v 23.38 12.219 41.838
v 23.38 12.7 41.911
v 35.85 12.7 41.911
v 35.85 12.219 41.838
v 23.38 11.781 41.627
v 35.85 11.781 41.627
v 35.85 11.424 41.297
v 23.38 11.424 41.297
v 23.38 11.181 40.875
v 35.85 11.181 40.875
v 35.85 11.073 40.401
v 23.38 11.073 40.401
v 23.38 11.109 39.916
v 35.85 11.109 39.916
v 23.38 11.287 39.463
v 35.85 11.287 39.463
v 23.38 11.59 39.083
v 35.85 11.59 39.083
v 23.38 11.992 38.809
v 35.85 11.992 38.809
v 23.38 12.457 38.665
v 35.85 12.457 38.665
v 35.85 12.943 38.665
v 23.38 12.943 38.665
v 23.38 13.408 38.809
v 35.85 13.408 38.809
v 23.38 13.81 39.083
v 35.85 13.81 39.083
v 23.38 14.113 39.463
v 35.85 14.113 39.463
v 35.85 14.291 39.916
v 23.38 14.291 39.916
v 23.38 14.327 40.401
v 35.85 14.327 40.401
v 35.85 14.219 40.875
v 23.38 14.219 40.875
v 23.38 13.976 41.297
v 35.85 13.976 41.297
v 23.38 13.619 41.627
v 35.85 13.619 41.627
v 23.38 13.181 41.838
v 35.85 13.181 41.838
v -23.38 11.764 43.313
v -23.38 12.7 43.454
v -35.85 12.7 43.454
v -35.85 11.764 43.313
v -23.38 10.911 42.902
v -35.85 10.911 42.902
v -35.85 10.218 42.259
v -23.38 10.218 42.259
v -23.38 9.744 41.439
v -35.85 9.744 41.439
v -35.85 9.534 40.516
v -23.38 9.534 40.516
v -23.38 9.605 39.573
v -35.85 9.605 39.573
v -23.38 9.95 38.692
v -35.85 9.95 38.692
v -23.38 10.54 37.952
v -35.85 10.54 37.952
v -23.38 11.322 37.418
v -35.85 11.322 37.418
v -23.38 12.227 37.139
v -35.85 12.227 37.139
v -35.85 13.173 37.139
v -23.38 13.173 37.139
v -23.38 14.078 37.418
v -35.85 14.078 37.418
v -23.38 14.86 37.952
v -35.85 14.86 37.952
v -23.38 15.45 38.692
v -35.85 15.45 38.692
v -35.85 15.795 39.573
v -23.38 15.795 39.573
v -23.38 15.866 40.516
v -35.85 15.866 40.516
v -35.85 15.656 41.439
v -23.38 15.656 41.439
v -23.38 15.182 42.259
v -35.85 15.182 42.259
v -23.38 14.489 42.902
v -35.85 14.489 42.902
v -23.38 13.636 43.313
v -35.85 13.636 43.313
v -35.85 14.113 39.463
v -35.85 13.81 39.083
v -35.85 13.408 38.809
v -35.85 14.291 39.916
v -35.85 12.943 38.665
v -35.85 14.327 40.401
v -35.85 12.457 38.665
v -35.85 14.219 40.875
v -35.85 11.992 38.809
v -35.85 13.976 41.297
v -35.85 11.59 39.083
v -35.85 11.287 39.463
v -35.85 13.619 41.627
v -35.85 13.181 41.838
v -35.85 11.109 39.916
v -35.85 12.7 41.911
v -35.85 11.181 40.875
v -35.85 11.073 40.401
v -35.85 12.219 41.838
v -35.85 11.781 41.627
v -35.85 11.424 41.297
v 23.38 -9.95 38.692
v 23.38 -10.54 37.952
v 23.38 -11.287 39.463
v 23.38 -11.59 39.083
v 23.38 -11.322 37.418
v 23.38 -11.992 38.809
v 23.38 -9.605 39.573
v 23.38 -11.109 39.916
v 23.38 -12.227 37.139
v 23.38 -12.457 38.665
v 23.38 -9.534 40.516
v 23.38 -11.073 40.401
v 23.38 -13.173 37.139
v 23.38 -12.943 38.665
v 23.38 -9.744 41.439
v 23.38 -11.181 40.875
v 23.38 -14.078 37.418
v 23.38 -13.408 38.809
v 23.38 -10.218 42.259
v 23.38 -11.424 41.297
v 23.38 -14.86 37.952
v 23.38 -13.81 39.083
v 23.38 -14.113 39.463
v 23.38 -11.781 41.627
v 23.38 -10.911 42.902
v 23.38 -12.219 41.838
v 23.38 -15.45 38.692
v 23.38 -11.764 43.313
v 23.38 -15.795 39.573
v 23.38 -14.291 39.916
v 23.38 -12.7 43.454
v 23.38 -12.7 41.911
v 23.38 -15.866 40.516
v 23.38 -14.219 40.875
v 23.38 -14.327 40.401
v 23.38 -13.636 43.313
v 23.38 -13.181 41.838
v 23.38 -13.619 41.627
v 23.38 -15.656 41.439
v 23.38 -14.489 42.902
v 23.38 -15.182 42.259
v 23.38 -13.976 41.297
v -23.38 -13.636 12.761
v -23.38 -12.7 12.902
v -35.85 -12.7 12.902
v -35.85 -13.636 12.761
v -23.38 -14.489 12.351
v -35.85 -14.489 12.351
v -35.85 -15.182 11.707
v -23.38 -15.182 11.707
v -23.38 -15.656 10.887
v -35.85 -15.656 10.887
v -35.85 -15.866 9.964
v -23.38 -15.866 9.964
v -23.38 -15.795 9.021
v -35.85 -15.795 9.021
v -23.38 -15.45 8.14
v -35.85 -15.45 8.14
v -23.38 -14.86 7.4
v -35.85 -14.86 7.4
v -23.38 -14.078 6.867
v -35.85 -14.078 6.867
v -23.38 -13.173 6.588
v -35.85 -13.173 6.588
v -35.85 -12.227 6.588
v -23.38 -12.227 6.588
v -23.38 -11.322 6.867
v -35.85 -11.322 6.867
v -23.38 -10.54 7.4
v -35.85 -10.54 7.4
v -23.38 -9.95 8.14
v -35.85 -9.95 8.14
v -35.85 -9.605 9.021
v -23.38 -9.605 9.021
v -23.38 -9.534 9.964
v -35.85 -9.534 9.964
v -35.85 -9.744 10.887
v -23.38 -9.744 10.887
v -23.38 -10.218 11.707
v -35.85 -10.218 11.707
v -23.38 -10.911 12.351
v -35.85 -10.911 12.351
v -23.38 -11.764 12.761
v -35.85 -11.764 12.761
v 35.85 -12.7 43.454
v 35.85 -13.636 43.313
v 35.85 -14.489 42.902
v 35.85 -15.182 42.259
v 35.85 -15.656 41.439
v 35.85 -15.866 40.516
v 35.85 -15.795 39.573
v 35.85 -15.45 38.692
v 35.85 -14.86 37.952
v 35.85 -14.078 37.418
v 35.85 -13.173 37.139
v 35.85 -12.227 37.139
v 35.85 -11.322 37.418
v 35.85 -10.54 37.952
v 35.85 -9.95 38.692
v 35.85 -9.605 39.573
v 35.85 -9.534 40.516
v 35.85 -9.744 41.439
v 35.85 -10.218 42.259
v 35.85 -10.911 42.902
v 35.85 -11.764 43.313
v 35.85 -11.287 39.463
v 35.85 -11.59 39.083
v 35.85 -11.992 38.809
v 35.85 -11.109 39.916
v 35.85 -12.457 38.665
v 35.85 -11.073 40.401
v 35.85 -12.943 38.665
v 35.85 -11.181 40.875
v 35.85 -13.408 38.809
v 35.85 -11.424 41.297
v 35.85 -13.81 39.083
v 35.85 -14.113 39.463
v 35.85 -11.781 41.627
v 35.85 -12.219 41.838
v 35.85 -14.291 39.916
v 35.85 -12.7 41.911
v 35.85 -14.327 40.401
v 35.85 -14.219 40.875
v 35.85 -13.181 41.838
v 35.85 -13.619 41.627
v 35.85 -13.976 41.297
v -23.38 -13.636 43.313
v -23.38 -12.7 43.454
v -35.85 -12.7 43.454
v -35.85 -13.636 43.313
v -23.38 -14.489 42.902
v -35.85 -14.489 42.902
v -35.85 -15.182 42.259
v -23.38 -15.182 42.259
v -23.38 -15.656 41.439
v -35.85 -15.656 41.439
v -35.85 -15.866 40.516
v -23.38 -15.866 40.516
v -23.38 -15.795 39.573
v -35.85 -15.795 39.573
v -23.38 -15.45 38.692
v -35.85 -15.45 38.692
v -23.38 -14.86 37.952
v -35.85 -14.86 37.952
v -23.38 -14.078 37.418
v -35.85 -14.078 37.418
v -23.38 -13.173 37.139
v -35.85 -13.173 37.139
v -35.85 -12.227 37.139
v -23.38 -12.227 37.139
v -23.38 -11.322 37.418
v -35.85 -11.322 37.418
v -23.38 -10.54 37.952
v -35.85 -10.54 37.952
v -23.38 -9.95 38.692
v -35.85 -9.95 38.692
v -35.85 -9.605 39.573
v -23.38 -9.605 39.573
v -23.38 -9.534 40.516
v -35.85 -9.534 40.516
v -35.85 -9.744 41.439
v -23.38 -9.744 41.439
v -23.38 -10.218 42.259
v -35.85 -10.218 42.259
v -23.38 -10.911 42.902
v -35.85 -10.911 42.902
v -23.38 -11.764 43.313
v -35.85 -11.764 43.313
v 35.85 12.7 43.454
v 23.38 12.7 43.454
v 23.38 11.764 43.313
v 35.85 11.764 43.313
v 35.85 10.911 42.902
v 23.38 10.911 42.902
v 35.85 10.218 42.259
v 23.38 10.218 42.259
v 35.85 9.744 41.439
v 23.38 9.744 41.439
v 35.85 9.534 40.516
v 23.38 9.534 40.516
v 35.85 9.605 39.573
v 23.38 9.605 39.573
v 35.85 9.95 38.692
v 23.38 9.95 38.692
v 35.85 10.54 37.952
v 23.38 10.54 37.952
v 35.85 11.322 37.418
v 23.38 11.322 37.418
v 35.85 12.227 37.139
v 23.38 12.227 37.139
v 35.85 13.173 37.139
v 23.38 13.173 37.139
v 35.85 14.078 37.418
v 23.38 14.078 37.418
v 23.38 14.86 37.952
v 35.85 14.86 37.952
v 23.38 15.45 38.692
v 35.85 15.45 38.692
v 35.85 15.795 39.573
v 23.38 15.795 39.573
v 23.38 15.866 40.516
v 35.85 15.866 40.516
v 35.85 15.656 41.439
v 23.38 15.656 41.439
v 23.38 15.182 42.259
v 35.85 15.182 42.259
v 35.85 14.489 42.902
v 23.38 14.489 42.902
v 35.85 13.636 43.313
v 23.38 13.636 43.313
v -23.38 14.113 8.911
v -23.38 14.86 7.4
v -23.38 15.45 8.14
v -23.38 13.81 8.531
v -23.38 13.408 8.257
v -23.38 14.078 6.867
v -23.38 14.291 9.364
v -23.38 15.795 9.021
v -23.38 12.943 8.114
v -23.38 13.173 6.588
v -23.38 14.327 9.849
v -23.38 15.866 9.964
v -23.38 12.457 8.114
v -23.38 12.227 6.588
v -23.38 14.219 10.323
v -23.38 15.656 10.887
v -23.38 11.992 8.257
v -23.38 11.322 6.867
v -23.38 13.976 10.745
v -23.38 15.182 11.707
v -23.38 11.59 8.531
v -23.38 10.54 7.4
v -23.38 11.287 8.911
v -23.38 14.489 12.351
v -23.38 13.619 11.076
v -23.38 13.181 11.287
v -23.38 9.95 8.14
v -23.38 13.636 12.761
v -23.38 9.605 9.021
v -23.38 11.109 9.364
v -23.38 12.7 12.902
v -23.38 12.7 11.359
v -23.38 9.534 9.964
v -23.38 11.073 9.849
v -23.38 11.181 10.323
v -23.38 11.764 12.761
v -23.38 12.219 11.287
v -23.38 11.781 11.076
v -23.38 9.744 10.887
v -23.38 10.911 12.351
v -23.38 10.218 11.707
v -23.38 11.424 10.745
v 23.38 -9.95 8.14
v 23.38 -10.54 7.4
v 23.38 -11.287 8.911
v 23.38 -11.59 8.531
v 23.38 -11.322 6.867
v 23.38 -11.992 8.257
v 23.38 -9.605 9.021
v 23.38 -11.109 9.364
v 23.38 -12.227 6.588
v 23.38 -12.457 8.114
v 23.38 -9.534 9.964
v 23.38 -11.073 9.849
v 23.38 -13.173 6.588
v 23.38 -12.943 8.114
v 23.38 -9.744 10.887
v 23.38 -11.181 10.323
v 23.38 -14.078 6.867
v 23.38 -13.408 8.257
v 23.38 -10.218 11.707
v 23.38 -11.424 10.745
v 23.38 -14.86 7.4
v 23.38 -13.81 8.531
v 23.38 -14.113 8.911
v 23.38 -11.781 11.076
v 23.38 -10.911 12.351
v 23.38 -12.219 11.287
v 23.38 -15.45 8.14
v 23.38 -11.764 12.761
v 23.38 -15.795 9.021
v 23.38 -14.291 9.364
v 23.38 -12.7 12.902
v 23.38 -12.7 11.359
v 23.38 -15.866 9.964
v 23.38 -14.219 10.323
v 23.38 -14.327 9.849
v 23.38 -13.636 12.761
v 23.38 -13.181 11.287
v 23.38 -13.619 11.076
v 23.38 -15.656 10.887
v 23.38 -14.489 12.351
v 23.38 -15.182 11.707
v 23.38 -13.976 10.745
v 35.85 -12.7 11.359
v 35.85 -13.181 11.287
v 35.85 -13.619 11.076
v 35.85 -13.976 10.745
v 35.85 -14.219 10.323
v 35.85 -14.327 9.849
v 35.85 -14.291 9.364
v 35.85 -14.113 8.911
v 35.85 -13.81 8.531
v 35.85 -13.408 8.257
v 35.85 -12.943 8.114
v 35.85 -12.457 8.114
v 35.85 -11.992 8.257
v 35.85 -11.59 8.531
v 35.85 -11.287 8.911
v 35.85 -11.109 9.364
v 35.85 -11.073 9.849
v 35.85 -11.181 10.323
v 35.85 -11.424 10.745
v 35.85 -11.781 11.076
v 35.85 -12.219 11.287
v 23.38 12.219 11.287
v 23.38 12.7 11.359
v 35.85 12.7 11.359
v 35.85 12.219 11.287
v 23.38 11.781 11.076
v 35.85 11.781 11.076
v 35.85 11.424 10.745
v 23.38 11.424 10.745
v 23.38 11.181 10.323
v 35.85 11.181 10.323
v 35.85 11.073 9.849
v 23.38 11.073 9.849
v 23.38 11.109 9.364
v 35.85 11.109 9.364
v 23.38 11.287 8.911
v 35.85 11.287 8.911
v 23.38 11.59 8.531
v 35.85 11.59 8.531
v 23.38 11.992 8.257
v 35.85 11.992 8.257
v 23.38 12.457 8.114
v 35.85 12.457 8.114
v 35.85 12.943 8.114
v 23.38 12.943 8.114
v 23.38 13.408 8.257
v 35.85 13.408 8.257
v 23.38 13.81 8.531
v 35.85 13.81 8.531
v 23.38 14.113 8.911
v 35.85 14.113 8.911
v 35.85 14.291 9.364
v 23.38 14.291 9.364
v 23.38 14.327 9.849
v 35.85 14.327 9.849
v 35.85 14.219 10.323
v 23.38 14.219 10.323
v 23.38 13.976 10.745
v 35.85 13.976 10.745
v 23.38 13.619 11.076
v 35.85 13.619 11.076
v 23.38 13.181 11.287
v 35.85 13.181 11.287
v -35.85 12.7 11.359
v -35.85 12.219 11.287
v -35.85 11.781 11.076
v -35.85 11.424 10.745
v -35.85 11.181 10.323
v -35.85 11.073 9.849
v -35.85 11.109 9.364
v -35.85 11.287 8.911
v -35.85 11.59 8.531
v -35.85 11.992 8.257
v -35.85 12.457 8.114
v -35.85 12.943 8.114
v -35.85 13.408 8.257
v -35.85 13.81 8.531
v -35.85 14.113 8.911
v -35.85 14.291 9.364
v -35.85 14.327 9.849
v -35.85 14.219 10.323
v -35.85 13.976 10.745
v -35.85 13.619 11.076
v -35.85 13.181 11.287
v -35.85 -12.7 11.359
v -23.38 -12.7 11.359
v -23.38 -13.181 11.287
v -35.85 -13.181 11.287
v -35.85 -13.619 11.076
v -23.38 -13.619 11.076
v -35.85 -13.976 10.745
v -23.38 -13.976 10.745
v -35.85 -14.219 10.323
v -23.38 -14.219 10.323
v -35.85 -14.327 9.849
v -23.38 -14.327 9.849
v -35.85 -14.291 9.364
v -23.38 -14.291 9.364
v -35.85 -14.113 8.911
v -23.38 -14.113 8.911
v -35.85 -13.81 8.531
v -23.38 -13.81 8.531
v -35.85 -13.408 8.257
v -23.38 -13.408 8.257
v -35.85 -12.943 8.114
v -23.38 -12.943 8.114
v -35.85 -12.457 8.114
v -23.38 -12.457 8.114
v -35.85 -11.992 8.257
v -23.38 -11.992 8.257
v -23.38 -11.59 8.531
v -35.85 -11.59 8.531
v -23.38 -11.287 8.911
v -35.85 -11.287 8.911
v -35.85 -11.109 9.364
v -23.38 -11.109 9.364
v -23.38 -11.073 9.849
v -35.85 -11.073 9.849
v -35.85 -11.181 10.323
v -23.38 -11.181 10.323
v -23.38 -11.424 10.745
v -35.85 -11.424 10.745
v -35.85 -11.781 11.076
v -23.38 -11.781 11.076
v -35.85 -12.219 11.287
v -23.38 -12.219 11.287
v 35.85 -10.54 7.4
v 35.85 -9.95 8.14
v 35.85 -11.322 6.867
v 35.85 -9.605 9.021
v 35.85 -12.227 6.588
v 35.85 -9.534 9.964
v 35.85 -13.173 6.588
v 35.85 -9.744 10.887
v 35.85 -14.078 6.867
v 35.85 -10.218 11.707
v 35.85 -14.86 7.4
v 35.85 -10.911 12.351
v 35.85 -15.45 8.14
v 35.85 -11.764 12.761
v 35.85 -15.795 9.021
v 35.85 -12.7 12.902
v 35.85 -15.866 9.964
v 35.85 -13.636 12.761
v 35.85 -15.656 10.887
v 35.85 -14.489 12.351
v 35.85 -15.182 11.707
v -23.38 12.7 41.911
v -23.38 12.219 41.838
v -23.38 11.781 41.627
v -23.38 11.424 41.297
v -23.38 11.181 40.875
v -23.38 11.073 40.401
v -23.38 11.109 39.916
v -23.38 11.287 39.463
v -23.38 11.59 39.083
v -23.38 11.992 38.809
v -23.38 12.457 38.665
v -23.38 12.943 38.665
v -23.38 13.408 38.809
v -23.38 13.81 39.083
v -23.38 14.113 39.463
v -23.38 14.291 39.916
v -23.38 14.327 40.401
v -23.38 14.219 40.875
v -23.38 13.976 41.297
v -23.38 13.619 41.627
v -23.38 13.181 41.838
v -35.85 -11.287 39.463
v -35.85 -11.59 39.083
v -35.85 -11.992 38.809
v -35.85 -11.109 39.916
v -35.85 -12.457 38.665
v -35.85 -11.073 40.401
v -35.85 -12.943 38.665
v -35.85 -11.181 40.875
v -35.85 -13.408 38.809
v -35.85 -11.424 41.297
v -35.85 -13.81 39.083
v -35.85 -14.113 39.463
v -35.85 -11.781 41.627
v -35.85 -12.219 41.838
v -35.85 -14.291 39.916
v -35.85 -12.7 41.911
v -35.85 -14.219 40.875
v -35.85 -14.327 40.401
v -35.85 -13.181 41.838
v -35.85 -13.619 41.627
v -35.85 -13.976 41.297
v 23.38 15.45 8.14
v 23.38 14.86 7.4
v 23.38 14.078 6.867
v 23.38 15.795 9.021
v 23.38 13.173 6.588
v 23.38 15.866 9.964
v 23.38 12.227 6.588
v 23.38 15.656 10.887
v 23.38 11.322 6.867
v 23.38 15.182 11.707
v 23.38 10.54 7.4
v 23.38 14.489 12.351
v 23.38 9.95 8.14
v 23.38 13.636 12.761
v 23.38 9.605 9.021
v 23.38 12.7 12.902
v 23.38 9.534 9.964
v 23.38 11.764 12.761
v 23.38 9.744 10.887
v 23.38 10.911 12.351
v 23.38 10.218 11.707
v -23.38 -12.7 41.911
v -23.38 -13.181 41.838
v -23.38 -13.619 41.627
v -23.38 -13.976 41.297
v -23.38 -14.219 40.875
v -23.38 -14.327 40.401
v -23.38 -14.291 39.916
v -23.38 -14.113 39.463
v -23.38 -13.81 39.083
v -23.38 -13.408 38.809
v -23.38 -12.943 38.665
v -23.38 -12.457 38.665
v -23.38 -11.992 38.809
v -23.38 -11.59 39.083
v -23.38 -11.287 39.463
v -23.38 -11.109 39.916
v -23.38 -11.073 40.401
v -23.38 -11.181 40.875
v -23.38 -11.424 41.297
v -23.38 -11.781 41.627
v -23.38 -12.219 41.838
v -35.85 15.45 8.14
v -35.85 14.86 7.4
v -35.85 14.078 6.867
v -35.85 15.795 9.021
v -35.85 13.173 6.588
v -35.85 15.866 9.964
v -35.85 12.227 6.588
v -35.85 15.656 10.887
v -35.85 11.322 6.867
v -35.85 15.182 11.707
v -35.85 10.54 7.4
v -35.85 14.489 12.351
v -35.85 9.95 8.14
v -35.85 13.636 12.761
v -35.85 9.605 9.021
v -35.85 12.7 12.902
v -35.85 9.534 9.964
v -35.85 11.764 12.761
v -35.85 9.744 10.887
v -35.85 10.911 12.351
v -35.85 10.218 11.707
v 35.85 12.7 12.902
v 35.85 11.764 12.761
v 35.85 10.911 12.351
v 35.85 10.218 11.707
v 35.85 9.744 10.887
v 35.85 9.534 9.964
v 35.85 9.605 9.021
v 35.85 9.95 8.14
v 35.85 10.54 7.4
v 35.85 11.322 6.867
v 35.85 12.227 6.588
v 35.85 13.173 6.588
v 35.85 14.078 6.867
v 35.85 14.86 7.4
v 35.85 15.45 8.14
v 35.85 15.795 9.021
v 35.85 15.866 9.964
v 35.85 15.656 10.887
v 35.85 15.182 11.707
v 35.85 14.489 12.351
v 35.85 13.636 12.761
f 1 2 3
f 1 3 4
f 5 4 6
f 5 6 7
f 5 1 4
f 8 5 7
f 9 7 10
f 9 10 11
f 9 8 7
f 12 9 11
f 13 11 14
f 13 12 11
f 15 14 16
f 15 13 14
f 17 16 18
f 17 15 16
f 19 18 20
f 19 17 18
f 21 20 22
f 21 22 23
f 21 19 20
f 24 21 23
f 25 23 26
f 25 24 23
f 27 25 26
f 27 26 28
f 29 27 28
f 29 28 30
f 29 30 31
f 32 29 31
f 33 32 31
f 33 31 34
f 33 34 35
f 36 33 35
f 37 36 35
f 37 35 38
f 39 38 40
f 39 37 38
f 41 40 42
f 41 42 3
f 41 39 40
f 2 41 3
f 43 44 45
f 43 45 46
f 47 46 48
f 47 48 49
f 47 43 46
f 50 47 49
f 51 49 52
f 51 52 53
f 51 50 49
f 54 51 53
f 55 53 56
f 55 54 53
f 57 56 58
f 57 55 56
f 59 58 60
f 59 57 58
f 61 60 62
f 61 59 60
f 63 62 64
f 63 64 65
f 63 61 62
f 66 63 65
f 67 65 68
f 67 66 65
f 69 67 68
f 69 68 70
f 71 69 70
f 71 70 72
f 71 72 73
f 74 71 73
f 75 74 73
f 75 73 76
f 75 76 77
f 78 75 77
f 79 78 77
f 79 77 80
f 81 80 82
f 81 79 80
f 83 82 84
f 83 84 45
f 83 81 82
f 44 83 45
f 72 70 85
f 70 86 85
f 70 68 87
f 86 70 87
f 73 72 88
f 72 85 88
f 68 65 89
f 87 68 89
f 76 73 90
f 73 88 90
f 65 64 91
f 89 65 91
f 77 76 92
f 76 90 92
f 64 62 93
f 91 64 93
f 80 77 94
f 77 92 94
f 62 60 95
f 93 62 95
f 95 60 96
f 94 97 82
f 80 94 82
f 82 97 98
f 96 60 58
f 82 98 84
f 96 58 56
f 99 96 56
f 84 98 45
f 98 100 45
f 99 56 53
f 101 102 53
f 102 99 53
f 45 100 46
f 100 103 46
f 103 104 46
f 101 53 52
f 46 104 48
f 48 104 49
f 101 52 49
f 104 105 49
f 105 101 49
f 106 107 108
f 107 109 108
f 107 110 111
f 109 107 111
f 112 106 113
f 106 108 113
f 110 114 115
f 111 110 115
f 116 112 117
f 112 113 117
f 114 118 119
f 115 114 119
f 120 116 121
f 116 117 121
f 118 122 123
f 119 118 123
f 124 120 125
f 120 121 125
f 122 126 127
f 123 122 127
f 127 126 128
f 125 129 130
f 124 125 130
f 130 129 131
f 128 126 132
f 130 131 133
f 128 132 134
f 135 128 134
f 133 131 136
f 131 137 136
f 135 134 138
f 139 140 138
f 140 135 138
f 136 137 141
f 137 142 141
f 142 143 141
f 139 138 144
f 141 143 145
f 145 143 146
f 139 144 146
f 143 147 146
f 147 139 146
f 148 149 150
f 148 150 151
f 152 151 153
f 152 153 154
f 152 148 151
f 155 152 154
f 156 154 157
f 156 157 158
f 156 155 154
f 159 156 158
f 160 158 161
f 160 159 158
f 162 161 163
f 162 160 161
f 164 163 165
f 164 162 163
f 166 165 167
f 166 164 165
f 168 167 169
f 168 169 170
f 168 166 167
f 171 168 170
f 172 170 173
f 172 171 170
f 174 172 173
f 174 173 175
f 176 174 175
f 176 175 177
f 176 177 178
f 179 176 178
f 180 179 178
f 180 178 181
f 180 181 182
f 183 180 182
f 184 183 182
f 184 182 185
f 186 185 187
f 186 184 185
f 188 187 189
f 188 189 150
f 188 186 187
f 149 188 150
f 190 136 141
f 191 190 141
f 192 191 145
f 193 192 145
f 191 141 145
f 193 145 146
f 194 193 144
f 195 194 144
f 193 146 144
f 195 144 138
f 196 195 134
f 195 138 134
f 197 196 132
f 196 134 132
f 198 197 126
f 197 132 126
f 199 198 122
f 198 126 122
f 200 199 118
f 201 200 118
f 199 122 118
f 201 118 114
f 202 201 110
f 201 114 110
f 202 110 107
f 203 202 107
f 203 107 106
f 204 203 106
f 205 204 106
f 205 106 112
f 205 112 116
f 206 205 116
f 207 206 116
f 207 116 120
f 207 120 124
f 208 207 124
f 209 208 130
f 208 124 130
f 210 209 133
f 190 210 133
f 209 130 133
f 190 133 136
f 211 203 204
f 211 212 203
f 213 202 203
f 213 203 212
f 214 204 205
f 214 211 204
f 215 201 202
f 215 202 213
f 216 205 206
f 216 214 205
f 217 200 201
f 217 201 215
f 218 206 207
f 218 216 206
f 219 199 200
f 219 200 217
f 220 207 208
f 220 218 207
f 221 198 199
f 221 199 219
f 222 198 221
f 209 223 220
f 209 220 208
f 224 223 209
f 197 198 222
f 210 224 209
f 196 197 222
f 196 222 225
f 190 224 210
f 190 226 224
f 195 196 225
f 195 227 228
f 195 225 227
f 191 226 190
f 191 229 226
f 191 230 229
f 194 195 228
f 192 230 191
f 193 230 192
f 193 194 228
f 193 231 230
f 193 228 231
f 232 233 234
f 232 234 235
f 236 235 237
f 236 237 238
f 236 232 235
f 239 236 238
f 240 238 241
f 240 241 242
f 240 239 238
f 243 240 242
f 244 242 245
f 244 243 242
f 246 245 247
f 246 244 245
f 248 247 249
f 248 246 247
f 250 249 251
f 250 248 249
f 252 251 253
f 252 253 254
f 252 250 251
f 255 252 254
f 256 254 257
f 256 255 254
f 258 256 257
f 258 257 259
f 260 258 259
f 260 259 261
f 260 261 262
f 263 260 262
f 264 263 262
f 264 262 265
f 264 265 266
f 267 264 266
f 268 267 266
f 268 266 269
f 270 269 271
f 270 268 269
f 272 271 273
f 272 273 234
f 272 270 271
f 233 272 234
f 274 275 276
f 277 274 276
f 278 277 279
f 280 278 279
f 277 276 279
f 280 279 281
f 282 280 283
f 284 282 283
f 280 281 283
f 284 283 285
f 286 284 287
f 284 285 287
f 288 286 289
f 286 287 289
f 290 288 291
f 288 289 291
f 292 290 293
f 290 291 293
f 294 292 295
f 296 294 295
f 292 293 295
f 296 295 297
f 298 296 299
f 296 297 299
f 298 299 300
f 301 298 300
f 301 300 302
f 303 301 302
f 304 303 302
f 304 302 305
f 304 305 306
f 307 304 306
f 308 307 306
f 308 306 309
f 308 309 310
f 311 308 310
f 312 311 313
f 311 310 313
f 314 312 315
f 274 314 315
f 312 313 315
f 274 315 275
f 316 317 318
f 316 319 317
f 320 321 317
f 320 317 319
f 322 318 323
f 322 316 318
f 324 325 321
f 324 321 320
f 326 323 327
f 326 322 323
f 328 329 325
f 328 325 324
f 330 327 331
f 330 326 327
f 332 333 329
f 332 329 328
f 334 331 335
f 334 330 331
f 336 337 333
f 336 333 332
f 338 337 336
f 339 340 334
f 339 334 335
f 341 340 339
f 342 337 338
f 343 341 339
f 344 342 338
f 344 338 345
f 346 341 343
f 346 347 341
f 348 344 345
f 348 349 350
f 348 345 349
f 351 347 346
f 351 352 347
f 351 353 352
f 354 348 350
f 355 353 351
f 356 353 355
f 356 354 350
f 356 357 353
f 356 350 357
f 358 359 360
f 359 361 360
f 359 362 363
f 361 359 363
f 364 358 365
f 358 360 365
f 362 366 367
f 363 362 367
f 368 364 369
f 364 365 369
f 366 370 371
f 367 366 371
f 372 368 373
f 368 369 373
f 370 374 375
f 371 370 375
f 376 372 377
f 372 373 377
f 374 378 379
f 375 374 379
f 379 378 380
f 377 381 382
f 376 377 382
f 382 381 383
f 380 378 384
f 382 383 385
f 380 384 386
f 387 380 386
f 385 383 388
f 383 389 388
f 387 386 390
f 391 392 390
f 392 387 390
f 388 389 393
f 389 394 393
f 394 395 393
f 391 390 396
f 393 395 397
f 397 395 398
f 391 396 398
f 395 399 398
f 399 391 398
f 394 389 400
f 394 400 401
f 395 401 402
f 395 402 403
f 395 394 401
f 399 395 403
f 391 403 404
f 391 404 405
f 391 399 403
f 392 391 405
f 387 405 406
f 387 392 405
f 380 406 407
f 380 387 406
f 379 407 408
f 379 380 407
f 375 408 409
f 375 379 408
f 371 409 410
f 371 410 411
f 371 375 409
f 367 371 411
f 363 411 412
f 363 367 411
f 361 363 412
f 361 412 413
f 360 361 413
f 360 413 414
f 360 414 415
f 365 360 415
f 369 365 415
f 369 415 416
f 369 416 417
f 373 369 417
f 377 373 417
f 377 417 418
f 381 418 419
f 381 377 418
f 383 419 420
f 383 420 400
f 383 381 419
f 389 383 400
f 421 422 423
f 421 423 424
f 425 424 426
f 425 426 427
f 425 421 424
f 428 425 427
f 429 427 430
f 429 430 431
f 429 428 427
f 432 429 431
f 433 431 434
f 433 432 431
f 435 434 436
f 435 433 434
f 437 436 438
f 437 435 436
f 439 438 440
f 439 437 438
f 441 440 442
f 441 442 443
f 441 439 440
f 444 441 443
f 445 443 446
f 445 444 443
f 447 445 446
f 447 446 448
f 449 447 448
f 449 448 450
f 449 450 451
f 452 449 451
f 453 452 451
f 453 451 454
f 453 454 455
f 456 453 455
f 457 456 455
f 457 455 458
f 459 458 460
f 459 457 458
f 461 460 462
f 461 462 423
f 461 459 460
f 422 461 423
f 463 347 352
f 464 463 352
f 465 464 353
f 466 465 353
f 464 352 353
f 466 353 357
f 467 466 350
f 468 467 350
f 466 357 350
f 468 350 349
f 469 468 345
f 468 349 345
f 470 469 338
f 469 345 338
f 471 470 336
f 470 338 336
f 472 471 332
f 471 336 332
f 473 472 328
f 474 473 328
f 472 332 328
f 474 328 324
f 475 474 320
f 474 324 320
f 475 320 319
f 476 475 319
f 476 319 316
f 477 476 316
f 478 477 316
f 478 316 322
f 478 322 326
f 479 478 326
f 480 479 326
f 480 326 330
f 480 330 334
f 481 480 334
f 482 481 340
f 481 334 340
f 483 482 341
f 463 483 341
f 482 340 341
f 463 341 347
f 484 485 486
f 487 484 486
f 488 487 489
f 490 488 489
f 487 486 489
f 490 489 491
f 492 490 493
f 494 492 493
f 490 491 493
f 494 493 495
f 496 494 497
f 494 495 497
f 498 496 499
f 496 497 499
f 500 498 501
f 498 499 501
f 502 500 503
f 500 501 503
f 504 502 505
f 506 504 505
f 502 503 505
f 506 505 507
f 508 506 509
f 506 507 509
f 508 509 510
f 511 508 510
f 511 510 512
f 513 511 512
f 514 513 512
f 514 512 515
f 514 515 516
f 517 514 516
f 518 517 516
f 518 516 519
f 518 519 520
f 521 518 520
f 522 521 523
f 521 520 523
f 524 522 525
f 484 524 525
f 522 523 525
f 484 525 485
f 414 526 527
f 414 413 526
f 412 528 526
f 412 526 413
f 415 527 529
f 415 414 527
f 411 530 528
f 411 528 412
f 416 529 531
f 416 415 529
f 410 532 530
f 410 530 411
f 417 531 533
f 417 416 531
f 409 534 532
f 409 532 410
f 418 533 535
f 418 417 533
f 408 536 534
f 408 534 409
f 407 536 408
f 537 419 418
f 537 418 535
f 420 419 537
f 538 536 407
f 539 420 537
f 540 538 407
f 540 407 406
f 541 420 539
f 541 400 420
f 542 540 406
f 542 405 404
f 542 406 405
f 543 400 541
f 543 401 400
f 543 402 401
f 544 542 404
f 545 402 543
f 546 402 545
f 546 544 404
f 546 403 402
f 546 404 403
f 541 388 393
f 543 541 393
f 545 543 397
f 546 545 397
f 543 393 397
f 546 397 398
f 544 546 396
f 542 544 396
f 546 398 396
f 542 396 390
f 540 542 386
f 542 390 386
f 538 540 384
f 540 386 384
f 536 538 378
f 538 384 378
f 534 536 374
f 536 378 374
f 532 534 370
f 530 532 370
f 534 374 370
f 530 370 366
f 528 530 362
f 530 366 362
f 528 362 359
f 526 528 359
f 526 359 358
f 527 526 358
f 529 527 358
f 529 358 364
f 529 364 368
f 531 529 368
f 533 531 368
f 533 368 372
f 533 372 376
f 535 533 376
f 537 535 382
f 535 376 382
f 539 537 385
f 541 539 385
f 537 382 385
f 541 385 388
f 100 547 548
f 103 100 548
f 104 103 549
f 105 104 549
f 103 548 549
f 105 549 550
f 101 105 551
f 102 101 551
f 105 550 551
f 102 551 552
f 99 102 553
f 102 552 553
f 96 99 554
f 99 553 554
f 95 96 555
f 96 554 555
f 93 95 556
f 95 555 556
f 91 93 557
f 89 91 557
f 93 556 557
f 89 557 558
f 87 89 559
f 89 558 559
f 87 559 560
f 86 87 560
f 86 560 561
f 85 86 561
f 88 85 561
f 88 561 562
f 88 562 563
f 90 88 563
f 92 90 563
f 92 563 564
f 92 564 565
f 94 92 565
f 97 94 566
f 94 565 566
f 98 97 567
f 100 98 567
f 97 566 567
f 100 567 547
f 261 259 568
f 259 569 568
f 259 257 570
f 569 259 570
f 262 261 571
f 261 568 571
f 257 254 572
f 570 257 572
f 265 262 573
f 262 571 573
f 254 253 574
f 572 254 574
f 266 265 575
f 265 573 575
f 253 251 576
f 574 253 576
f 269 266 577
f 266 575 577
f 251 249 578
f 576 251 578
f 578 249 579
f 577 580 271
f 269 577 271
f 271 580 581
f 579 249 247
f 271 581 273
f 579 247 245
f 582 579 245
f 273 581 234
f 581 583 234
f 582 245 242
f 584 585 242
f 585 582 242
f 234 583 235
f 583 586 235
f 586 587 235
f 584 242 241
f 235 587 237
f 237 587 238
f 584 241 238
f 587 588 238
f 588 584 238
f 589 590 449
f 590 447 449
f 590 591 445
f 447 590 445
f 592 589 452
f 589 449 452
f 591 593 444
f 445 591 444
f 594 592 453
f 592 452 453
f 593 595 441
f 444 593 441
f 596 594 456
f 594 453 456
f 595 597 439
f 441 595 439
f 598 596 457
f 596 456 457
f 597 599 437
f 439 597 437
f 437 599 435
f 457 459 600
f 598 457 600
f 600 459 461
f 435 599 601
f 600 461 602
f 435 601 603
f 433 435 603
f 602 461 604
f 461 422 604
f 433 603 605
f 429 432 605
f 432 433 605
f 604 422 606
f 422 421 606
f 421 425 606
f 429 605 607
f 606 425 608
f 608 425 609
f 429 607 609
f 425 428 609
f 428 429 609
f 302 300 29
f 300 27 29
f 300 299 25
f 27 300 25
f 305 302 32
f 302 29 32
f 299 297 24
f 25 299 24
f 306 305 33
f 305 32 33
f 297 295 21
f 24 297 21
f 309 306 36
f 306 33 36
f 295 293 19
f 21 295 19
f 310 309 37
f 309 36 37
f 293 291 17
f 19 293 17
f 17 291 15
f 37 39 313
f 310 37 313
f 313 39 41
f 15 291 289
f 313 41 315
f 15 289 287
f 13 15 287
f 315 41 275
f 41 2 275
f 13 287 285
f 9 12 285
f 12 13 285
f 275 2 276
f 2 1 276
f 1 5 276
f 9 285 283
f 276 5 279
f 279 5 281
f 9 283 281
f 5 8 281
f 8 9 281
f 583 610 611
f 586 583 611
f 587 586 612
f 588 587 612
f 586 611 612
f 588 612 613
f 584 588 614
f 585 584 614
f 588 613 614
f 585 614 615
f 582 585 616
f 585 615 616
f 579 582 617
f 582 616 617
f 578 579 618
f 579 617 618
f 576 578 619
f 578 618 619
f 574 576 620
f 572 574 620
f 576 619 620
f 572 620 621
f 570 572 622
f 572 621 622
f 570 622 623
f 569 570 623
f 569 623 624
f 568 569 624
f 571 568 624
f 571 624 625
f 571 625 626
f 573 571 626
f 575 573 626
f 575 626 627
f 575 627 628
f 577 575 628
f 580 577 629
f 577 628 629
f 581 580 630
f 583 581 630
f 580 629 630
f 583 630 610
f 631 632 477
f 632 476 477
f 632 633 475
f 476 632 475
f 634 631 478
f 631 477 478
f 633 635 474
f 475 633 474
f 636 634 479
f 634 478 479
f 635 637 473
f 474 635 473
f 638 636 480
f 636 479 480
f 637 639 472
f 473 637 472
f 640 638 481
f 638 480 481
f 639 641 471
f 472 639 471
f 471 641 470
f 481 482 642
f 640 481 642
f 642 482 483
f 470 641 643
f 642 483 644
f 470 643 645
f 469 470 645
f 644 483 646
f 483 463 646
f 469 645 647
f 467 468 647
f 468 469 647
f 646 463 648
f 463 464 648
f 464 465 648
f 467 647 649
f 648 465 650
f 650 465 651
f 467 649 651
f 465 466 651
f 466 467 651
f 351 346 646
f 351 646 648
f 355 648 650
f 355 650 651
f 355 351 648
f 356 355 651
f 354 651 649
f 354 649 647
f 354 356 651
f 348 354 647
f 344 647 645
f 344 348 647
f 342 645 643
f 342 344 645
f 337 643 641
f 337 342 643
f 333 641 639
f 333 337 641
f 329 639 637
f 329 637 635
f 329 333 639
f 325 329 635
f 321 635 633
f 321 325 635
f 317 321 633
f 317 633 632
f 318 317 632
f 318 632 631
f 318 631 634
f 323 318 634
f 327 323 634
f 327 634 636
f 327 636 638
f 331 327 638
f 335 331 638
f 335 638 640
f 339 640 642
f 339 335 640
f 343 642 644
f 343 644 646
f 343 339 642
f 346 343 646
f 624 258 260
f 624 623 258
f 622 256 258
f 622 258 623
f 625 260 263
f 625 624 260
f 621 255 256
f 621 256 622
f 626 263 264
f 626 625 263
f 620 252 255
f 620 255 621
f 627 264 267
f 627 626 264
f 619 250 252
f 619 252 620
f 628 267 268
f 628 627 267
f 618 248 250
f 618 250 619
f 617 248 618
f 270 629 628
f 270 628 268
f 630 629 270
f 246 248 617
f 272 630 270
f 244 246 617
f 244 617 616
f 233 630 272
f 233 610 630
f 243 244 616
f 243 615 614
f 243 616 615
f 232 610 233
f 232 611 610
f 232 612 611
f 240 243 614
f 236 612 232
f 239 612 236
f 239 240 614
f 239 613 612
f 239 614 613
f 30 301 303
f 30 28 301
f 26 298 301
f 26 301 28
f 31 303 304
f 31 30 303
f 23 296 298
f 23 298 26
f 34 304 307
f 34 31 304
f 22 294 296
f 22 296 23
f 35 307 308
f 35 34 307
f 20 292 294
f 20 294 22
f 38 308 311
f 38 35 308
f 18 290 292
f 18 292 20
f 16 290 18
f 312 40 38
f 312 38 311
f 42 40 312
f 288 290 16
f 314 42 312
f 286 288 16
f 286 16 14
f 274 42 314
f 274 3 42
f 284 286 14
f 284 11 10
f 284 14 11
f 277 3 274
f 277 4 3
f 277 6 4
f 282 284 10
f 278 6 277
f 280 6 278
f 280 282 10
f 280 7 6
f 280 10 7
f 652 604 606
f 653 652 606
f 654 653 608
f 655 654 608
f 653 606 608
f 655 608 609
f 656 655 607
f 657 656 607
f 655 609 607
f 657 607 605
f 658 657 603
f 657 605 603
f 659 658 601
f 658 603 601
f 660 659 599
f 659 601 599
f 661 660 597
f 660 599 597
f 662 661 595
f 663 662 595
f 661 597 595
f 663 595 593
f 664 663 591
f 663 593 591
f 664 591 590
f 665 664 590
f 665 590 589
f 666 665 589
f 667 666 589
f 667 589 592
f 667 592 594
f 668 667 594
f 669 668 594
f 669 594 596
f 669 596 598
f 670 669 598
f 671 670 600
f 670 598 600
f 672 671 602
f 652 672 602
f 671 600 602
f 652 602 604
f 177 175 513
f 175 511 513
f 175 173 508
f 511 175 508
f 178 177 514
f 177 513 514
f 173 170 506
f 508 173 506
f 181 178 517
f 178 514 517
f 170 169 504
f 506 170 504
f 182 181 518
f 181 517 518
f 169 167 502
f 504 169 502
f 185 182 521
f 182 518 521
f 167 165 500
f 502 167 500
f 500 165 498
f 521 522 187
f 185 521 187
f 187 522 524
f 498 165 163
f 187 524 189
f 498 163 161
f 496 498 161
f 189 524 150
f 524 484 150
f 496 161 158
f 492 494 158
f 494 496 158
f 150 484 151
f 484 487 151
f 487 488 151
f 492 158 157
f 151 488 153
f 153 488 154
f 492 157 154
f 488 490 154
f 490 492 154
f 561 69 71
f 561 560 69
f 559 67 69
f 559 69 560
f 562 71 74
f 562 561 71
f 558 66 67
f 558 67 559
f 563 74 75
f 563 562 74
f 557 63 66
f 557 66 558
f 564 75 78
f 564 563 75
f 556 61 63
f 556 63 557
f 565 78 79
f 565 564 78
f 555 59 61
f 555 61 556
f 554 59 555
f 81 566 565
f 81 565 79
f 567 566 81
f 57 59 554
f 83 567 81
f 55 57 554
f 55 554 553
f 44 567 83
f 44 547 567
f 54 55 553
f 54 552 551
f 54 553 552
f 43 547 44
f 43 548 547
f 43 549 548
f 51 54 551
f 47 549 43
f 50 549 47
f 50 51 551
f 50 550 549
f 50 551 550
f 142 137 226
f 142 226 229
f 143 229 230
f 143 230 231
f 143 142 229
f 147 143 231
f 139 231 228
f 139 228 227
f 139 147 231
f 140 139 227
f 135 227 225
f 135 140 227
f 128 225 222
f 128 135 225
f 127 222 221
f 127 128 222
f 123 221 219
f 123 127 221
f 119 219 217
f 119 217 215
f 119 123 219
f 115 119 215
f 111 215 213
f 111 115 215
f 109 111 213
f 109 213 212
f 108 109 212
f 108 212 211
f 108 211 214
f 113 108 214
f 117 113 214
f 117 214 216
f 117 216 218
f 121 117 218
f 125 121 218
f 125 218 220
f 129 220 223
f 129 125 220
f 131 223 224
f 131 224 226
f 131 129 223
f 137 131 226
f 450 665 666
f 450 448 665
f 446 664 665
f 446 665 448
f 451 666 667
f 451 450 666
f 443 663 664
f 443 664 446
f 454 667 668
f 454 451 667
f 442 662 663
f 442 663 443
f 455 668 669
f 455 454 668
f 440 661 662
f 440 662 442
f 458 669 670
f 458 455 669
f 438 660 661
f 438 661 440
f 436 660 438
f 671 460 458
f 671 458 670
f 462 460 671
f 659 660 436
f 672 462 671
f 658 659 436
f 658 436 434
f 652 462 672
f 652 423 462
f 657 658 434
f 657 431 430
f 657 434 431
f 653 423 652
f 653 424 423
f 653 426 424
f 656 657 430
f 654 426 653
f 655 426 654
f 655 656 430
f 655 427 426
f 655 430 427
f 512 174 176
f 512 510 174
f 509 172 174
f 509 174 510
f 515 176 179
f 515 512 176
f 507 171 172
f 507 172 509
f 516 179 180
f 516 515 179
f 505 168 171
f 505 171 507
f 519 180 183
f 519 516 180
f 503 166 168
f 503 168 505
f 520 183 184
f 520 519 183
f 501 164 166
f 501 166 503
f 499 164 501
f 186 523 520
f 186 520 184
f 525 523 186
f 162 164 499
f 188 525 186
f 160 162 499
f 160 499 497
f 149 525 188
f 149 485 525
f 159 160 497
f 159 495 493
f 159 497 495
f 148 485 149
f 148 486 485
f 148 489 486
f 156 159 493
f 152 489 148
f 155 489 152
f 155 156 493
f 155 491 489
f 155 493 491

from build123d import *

# Parameters (mm, degrees)
BOSS_EXTRUDE2_START   = 23.38
SKETCH2_R             = 3.175
SKETCH2_R_2           = 1.63195
BOSS_EXTRUDE2_DEPTH   = 12.469999952
BOSS_EXTRUDE2_2_DEPTH = 12.469999952
BOSS_EXTRUDE2_3_DEPTH = 12.469999952
BOSS_EXTRUDE2_4_DEPTH = 12.469999952


with BuildPart() as part:
    # Sketch2 → Boss-Extrude2 (new body)
    with BuildSketch(Plane(origin=(0, 0, 0), x_dir=(0, 0, -1), z_dir=(1, 0, 0)).offset(BOSS_EXTRUDE2_START)):
        with Locations(Location((-40.279022884, 12.7, 0), (0, 0, 180))):
            Circle(SKETCH2_R)
        with Locations(Location((-40.279022884, 12.7, 0), (0, 0, 180))):
            Circle(SKETCH2_R_2, mode=Mode.SUBTRACT)
    extrude(amount=BOSS_EXTRUDE2_DEPTH)


with BuildPart() as body_2:
    # Sketch2 → Boss-Extrude2 2 (new body)
    with BuildSketch(Plane(origin=(0, 0, 0), x_dir=(0, 0, -1), z_dir=(1, 0, 0)).offset(BOSS_EXTRUDE2_START)):
        with Locations(Location((-40.279022884, -12.7, 0), (0, 0, 180))):
            Circle(SKETCH2_R)
        with Locations(Location((-40.279022884, -12.7, 0), (0, 0, 180))):
            Circle(SKETCH2_R_2, mode=Mode.SUBTRACT)
    extrude(amount=BOSS_EXTRUDE2_2_DEPTH)


with BuildPart() as body_3:
    # Sketch2 → Boss-Extrude2 3 (new body)
    with BuildSketch(Plane(origin=(0, 0, 0), x_dir=(0, 0, -1), z_dir=(1, 0, 0)).offset(BOSS_EXTRUDE2_START)):
        with Locations(Location((-9.727227116, -12.7, 0), (0, 0, 180))):
            Circle(SKETCH2_R)
        with Locations(Location((-9.727227116, -12.7, 0), (0, 0, 180))):
            Circle(SKETCH2_R_2, mode=Mode.SUBTRACT)
    extrude(amount=BOSS_EXTRUDE2_3_DEPTH)


with BuildPart() as body_4:
    # Sketch2 → Boss-Extrude2 4 (new body)
    with BuildSketch(Plane(origin=(0, 0, 0), x_dir=(0, 0, -1), z_dir=(1, 0, 0)).offset(BOSS_EXTRUDE2_START)):
        with Locations(Location((-9.727227116, 12.7, 0), (0, 0, 180))):
            Circle(SKETCH2_R)
        with Locations(Location((-9.727227116, 12.7, 0), (0, 0, 180))):
            Circle(SKETCH2_R_2, mode=Mode.SUBTRACT)
    extrude(amount=BOSS_EXTRUDE2_4_DEPTH)


with BuildPart() as body_5:
    # Mirror2: mirrored copy
    add(body_4.part.mirror(Plane(origin=(0, 0, 0), x_dir=(0, 0, 1), z_dir=(1, 0, 0))))


with BuildPart() as body_6:
    # Mirror2 2: mirrored copy
    add(part.part.mirror(Plane(origin=(0, 0, 0), x_dir=(0, 0, 1), z_dir=(1, 0, 0))))


with BuildPart() as body_7:
    # Mirror2 3: mirrored copy
    add(body_2.part.mirror(Plane(origin=(0, 0, 0), x_dir=(0, 0, 1), z_dir=(1, 0, 0))))


with BuildPart() as body_8:
    # Mirror2 4: mirrored copy
    add(body_3.part.mirror(Plane(origin=(0, 0, 0), x_dir=(0, 0, 1), z_dir=(1, 0, 0))))


solid = Compound([part.part, body_2.part, body_3.part, body_4.part, body_5.part, body_6.part, body_7.part, body_8.part])
